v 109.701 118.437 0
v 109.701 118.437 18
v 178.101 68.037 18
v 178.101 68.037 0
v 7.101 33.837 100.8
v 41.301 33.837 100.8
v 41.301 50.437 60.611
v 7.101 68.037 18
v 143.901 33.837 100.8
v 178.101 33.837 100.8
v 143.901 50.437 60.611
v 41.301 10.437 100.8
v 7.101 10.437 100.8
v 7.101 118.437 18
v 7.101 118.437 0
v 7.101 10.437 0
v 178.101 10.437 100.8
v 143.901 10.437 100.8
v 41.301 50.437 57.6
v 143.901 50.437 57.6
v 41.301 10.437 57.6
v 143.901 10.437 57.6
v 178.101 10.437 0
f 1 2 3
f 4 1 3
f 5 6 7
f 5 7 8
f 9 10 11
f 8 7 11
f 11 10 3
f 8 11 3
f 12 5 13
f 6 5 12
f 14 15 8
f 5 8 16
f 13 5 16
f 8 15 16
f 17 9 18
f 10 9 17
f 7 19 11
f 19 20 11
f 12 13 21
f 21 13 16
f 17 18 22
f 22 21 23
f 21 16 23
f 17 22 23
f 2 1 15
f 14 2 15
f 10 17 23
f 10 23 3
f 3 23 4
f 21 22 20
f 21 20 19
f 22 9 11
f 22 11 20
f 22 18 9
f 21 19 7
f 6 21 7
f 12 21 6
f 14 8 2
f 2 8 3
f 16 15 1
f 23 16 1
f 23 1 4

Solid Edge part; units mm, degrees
sketch "Sketch1" plane through (0, 0, 0) normal (0, 0, 1) x (1, 0, 0)
  line L0 (7.1014, 10.4369) -> (178.1014, 10.4369)
  line L1 (178.1014, 10.4369) -> (178.1014, 118.4369)
  line L2 (178.1014, 118.4369) -> (7.1014, 118.4369)
  line L3 (7.1014, 118.4369) -> (7.1014, 10.4369)
extrude "Protrusion1" add sketch "Sketch1" along normal blind 100.8
sketch "Sketch2" plane through (178.1014, 64.4369, 50.4) normal (1, 0, 0) x (0, 0, -1)
  line L0 (-50.4, -30.6) -> (32.4, 3.6)
  line L1 (32.4, 3.6) -> (32.4, 54)
  line L2 (32.4, 54) -> (-50.4, 54)
  line L3 (-50.4, 54) -> (-50.4, -30.6)
  dimension "D1" = 23.4
  dimension "D2" = 18
  dimension "D3" = 50.4
extrude "ExtrudedCutout_3" cut sketch "Sketch2" against normal blind 200
sketch "Sketch3" plane through (92.6014, 10.4369, 50.4) normal (0, -1, 0) x (0, 0, 1)
  line L0 (50.4, -51.3) -> (7.2, -51.3)
  line L1 (7.2, -51.3) -> (7.2, 51.3)
  line L2 (7.2, 51.3) -> (50.4, 51.3)
  line L3 (50.4, 51.3) -> (50.4, -51.3)
  dimension "D1" = 34.2
  dimension "D2" = 136.8
  dimension "D3" = 43.2
extrude "ExtrudedCutout_5" cut sketch "Sketch3" against normal blind 40
sketch "Sketch4" plane through (92.6014, 93.2369, 18) normal (0, 0, 1) x (0, 1, 0)
  line L0 (25.2, -17.1) -> (-25.2, -85.5)
  line L1 (-25.2, -85.5) -> (25.2, -85.5)
  line L2 (25.2, -85.5) -> (25.2, -17.1)
  dimension "D1" = 102.6
extrude "ExtrudedCutout_6" cut sketch "Sketch4" against normal blind 40
